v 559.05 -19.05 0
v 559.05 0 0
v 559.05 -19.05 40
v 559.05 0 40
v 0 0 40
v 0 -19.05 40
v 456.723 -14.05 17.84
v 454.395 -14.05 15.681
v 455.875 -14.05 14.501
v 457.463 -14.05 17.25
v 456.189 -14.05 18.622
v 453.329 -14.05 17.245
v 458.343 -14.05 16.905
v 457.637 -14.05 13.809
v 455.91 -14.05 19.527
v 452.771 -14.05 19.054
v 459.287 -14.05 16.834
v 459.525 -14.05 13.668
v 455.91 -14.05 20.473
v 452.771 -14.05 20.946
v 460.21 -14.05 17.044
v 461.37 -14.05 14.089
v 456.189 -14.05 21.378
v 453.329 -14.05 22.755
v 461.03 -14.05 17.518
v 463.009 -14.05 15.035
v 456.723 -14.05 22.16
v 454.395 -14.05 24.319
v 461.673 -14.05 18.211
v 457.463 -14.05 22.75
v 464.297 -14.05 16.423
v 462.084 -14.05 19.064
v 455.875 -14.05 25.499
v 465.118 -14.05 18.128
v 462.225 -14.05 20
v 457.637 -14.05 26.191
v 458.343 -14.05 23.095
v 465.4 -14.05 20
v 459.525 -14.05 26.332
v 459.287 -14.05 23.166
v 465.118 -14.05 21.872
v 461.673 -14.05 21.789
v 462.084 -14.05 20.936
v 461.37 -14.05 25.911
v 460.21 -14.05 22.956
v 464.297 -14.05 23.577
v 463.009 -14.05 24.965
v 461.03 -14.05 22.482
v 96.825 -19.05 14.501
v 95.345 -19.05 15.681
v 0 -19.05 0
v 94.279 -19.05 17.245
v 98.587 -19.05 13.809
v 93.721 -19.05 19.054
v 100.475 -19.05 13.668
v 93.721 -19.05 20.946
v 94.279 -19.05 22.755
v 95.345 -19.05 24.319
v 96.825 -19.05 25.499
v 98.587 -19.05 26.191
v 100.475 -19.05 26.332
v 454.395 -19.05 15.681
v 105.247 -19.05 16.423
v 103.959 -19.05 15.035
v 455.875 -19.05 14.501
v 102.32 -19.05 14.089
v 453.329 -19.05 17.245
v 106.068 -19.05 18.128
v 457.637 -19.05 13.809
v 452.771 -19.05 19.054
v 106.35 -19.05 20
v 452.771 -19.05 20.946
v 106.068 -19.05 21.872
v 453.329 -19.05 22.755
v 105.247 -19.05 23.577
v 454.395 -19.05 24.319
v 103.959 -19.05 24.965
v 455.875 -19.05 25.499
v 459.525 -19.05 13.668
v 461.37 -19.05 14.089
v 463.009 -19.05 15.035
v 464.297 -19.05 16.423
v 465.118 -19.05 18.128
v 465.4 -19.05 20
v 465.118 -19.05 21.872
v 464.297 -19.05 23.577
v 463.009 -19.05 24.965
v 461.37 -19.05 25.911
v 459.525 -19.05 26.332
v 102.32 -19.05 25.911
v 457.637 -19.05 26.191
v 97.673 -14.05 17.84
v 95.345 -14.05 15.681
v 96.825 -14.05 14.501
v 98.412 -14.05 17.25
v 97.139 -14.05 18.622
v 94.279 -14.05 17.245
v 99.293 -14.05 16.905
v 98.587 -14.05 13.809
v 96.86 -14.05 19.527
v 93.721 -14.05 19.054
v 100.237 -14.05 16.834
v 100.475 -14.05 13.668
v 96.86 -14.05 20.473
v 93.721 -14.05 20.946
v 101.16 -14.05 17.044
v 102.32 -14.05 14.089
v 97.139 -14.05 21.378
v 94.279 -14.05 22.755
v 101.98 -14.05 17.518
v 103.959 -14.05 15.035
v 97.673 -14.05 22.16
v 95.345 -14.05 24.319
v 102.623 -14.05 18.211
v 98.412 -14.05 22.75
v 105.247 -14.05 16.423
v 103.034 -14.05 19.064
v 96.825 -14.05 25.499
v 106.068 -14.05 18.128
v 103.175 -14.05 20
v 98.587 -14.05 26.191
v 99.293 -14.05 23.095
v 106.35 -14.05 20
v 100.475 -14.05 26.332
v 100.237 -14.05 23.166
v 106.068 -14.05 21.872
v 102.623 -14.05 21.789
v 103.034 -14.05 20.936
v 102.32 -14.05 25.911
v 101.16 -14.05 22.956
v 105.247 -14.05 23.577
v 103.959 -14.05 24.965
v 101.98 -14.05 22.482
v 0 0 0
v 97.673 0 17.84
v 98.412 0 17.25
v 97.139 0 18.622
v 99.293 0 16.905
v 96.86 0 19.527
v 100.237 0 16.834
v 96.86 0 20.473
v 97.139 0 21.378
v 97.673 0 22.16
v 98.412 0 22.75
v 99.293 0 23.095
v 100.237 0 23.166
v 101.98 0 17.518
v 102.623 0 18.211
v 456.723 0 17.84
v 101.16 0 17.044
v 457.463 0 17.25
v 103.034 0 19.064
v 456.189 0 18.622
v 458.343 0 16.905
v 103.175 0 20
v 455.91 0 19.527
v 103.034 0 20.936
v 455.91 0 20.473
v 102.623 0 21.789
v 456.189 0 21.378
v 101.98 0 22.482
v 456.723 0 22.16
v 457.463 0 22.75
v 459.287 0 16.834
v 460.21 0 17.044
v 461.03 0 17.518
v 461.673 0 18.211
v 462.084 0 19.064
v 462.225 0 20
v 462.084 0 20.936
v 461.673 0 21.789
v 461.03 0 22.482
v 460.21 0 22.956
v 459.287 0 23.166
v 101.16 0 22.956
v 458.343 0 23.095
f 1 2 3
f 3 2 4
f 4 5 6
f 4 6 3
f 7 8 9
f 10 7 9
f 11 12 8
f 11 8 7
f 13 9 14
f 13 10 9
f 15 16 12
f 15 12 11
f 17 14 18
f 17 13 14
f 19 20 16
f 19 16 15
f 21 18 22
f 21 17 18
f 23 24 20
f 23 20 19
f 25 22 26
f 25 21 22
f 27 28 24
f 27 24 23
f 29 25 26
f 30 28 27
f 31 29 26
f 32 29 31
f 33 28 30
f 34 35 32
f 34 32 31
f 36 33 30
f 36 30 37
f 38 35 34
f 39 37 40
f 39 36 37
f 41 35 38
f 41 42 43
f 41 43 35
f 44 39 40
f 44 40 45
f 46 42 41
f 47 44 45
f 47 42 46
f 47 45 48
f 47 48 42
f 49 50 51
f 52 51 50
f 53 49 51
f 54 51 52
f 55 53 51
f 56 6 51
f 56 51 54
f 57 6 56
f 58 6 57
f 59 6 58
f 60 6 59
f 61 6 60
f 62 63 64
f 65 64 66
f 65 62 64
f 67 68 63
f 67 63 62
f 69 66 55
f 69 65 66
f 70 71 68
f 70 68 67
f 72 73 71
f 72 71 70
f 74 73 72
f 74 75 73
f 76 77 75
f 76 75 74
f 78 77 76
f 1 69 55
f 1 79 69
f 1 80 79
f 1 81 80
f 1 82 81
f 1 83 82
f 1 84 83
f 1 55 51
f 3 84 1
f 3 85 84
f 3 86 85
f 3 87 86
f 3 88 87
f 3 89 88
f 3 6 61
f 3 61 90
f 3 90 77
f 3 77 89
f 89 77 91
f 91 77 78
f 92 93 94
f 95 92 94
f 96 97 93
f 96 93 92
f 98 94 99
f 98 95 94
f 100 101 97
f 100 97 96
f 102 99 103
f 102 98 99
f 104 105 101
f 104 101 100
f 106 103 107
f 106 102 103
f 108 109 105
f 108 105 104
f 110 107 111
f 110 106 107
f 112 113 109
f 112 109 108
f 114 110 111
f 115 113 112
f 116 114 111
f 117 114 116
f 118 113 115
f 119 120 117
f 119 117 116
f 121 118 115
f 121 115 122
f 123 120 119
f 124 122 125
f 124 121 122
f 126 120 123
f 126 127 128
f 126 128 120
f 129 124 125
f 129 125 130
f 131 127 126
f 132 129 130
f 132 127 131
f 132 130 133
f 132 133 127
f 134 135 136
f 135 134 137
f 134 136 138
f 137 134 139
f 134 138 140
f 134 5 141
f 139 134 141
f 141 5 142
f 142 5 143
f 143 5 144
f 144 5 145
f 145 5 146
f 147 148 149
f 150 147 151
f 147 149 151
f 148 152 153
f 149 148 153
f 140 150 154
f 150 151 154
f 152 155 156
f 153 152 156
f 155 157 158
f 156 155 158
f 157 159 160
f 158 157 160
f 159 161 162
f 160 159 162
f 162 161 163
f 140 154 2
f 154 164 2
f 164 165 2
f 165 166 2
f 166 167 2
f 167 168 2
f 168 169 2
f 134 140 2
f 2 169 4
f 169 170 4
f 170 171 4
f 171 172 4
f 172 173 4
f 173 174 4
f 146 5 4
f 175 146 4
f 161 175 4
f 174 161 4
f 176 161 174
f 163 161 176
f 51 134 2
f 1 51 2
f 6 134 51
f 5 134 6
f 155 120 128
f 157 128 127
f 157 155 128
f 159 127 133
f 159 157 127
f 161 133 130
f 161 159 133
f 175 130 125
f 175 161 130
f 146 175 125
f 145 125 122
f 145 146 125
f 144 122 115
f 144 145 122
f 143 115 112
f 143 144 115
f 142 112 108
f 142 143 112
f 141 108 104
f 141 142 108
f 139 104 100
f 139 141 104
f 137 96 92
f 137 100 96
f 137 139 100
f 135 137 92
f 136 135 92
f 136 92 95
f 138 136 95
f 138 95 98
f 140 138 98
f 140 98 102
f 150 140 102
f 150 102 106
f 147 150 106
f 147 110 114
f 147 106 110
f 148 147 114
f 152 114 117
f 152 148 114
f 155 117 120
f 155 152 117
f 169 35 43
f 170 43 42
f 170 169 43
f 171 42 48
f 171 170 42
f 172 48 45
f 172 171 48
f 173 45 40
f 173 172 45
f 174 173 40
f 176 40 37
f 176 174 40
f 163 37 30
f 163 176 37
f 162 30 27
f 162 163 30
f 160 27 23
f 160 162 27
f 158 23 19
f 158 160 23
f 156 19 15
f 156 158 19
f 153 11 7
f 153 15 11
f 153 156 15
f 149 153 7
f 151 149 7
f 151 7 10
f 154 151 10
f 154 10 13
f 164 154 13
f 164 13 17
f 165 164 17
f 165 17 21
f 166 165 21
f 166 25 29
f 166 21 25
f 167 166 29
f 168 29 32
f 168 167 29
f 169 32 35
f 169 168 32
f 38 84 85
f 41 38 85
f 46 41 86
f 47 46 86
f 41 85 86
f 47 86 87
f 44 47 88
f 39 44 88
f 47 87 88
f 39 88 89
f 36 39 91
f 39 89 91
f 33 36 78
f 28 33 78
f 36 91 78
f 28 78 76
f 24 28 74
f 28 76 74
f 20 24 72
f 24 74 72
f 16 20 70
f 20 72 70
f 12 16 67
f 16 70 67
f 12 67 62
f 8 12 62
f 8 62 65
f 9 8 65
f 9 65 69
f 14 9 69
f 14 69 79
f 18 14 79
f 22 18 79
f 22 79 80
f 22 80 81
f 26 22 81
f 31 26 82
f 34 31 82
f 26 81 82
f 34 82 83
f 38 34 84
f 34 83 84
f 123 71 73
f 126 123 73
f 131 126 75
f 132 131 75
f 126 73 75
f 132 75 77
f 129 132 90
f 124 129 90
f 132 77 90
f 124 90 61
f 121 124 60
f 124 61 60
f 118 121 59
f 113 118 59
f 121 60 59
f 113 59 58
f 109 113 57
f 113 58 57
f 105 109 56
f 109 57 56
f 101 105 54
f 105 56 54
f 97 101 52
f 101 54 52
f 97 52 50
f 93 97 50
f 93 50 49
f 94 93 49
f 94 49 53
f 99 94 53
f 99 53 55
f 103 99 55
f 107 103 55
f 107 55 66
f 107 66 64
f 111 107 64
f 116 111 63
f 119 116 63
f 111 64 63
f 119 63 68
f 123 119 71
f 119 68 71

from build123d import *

# Parameters (mm, degrees)
SKETCH_W     = 559.05
SKETCH_H     = 40
SKETCH_R     = 3.175
PAD_DEPTH    = 19.05
SKETCH001_R  = 6.35
POCKET_DEPTH = 5


with BuildPart() as part:
    # Sketch → Pad (new body)
    with BuildSketch(Plane.XZ):
        with Locations((279.525, 20)):
            Rectangle(SKETCH_W, SKETCH_H)
        with Locations((100, 20)):
            Circle(SKETCH_R, mode=Mode.SUBTRACT)
        with Locations((459.05, 20)):
            Circle(SKETCH_R, mode=Mode.SUBTRACT)
    extrude(amount=PAD_DEPTH)

    # Sketch001 (on Face8 of Pad) → Pocket (cut)
    with BuildSketch(Plane.XZ.offset(19.05)):
        with Locations((100, 20)):
            Circle(SKETCH001_R)
        with Locations((459.05, 20)):
            Circle(SKETCH001_R)
    extrude(amount=-POCKET_DEPTH, mode=Mode.SUBTRACT)


solid = part.part
